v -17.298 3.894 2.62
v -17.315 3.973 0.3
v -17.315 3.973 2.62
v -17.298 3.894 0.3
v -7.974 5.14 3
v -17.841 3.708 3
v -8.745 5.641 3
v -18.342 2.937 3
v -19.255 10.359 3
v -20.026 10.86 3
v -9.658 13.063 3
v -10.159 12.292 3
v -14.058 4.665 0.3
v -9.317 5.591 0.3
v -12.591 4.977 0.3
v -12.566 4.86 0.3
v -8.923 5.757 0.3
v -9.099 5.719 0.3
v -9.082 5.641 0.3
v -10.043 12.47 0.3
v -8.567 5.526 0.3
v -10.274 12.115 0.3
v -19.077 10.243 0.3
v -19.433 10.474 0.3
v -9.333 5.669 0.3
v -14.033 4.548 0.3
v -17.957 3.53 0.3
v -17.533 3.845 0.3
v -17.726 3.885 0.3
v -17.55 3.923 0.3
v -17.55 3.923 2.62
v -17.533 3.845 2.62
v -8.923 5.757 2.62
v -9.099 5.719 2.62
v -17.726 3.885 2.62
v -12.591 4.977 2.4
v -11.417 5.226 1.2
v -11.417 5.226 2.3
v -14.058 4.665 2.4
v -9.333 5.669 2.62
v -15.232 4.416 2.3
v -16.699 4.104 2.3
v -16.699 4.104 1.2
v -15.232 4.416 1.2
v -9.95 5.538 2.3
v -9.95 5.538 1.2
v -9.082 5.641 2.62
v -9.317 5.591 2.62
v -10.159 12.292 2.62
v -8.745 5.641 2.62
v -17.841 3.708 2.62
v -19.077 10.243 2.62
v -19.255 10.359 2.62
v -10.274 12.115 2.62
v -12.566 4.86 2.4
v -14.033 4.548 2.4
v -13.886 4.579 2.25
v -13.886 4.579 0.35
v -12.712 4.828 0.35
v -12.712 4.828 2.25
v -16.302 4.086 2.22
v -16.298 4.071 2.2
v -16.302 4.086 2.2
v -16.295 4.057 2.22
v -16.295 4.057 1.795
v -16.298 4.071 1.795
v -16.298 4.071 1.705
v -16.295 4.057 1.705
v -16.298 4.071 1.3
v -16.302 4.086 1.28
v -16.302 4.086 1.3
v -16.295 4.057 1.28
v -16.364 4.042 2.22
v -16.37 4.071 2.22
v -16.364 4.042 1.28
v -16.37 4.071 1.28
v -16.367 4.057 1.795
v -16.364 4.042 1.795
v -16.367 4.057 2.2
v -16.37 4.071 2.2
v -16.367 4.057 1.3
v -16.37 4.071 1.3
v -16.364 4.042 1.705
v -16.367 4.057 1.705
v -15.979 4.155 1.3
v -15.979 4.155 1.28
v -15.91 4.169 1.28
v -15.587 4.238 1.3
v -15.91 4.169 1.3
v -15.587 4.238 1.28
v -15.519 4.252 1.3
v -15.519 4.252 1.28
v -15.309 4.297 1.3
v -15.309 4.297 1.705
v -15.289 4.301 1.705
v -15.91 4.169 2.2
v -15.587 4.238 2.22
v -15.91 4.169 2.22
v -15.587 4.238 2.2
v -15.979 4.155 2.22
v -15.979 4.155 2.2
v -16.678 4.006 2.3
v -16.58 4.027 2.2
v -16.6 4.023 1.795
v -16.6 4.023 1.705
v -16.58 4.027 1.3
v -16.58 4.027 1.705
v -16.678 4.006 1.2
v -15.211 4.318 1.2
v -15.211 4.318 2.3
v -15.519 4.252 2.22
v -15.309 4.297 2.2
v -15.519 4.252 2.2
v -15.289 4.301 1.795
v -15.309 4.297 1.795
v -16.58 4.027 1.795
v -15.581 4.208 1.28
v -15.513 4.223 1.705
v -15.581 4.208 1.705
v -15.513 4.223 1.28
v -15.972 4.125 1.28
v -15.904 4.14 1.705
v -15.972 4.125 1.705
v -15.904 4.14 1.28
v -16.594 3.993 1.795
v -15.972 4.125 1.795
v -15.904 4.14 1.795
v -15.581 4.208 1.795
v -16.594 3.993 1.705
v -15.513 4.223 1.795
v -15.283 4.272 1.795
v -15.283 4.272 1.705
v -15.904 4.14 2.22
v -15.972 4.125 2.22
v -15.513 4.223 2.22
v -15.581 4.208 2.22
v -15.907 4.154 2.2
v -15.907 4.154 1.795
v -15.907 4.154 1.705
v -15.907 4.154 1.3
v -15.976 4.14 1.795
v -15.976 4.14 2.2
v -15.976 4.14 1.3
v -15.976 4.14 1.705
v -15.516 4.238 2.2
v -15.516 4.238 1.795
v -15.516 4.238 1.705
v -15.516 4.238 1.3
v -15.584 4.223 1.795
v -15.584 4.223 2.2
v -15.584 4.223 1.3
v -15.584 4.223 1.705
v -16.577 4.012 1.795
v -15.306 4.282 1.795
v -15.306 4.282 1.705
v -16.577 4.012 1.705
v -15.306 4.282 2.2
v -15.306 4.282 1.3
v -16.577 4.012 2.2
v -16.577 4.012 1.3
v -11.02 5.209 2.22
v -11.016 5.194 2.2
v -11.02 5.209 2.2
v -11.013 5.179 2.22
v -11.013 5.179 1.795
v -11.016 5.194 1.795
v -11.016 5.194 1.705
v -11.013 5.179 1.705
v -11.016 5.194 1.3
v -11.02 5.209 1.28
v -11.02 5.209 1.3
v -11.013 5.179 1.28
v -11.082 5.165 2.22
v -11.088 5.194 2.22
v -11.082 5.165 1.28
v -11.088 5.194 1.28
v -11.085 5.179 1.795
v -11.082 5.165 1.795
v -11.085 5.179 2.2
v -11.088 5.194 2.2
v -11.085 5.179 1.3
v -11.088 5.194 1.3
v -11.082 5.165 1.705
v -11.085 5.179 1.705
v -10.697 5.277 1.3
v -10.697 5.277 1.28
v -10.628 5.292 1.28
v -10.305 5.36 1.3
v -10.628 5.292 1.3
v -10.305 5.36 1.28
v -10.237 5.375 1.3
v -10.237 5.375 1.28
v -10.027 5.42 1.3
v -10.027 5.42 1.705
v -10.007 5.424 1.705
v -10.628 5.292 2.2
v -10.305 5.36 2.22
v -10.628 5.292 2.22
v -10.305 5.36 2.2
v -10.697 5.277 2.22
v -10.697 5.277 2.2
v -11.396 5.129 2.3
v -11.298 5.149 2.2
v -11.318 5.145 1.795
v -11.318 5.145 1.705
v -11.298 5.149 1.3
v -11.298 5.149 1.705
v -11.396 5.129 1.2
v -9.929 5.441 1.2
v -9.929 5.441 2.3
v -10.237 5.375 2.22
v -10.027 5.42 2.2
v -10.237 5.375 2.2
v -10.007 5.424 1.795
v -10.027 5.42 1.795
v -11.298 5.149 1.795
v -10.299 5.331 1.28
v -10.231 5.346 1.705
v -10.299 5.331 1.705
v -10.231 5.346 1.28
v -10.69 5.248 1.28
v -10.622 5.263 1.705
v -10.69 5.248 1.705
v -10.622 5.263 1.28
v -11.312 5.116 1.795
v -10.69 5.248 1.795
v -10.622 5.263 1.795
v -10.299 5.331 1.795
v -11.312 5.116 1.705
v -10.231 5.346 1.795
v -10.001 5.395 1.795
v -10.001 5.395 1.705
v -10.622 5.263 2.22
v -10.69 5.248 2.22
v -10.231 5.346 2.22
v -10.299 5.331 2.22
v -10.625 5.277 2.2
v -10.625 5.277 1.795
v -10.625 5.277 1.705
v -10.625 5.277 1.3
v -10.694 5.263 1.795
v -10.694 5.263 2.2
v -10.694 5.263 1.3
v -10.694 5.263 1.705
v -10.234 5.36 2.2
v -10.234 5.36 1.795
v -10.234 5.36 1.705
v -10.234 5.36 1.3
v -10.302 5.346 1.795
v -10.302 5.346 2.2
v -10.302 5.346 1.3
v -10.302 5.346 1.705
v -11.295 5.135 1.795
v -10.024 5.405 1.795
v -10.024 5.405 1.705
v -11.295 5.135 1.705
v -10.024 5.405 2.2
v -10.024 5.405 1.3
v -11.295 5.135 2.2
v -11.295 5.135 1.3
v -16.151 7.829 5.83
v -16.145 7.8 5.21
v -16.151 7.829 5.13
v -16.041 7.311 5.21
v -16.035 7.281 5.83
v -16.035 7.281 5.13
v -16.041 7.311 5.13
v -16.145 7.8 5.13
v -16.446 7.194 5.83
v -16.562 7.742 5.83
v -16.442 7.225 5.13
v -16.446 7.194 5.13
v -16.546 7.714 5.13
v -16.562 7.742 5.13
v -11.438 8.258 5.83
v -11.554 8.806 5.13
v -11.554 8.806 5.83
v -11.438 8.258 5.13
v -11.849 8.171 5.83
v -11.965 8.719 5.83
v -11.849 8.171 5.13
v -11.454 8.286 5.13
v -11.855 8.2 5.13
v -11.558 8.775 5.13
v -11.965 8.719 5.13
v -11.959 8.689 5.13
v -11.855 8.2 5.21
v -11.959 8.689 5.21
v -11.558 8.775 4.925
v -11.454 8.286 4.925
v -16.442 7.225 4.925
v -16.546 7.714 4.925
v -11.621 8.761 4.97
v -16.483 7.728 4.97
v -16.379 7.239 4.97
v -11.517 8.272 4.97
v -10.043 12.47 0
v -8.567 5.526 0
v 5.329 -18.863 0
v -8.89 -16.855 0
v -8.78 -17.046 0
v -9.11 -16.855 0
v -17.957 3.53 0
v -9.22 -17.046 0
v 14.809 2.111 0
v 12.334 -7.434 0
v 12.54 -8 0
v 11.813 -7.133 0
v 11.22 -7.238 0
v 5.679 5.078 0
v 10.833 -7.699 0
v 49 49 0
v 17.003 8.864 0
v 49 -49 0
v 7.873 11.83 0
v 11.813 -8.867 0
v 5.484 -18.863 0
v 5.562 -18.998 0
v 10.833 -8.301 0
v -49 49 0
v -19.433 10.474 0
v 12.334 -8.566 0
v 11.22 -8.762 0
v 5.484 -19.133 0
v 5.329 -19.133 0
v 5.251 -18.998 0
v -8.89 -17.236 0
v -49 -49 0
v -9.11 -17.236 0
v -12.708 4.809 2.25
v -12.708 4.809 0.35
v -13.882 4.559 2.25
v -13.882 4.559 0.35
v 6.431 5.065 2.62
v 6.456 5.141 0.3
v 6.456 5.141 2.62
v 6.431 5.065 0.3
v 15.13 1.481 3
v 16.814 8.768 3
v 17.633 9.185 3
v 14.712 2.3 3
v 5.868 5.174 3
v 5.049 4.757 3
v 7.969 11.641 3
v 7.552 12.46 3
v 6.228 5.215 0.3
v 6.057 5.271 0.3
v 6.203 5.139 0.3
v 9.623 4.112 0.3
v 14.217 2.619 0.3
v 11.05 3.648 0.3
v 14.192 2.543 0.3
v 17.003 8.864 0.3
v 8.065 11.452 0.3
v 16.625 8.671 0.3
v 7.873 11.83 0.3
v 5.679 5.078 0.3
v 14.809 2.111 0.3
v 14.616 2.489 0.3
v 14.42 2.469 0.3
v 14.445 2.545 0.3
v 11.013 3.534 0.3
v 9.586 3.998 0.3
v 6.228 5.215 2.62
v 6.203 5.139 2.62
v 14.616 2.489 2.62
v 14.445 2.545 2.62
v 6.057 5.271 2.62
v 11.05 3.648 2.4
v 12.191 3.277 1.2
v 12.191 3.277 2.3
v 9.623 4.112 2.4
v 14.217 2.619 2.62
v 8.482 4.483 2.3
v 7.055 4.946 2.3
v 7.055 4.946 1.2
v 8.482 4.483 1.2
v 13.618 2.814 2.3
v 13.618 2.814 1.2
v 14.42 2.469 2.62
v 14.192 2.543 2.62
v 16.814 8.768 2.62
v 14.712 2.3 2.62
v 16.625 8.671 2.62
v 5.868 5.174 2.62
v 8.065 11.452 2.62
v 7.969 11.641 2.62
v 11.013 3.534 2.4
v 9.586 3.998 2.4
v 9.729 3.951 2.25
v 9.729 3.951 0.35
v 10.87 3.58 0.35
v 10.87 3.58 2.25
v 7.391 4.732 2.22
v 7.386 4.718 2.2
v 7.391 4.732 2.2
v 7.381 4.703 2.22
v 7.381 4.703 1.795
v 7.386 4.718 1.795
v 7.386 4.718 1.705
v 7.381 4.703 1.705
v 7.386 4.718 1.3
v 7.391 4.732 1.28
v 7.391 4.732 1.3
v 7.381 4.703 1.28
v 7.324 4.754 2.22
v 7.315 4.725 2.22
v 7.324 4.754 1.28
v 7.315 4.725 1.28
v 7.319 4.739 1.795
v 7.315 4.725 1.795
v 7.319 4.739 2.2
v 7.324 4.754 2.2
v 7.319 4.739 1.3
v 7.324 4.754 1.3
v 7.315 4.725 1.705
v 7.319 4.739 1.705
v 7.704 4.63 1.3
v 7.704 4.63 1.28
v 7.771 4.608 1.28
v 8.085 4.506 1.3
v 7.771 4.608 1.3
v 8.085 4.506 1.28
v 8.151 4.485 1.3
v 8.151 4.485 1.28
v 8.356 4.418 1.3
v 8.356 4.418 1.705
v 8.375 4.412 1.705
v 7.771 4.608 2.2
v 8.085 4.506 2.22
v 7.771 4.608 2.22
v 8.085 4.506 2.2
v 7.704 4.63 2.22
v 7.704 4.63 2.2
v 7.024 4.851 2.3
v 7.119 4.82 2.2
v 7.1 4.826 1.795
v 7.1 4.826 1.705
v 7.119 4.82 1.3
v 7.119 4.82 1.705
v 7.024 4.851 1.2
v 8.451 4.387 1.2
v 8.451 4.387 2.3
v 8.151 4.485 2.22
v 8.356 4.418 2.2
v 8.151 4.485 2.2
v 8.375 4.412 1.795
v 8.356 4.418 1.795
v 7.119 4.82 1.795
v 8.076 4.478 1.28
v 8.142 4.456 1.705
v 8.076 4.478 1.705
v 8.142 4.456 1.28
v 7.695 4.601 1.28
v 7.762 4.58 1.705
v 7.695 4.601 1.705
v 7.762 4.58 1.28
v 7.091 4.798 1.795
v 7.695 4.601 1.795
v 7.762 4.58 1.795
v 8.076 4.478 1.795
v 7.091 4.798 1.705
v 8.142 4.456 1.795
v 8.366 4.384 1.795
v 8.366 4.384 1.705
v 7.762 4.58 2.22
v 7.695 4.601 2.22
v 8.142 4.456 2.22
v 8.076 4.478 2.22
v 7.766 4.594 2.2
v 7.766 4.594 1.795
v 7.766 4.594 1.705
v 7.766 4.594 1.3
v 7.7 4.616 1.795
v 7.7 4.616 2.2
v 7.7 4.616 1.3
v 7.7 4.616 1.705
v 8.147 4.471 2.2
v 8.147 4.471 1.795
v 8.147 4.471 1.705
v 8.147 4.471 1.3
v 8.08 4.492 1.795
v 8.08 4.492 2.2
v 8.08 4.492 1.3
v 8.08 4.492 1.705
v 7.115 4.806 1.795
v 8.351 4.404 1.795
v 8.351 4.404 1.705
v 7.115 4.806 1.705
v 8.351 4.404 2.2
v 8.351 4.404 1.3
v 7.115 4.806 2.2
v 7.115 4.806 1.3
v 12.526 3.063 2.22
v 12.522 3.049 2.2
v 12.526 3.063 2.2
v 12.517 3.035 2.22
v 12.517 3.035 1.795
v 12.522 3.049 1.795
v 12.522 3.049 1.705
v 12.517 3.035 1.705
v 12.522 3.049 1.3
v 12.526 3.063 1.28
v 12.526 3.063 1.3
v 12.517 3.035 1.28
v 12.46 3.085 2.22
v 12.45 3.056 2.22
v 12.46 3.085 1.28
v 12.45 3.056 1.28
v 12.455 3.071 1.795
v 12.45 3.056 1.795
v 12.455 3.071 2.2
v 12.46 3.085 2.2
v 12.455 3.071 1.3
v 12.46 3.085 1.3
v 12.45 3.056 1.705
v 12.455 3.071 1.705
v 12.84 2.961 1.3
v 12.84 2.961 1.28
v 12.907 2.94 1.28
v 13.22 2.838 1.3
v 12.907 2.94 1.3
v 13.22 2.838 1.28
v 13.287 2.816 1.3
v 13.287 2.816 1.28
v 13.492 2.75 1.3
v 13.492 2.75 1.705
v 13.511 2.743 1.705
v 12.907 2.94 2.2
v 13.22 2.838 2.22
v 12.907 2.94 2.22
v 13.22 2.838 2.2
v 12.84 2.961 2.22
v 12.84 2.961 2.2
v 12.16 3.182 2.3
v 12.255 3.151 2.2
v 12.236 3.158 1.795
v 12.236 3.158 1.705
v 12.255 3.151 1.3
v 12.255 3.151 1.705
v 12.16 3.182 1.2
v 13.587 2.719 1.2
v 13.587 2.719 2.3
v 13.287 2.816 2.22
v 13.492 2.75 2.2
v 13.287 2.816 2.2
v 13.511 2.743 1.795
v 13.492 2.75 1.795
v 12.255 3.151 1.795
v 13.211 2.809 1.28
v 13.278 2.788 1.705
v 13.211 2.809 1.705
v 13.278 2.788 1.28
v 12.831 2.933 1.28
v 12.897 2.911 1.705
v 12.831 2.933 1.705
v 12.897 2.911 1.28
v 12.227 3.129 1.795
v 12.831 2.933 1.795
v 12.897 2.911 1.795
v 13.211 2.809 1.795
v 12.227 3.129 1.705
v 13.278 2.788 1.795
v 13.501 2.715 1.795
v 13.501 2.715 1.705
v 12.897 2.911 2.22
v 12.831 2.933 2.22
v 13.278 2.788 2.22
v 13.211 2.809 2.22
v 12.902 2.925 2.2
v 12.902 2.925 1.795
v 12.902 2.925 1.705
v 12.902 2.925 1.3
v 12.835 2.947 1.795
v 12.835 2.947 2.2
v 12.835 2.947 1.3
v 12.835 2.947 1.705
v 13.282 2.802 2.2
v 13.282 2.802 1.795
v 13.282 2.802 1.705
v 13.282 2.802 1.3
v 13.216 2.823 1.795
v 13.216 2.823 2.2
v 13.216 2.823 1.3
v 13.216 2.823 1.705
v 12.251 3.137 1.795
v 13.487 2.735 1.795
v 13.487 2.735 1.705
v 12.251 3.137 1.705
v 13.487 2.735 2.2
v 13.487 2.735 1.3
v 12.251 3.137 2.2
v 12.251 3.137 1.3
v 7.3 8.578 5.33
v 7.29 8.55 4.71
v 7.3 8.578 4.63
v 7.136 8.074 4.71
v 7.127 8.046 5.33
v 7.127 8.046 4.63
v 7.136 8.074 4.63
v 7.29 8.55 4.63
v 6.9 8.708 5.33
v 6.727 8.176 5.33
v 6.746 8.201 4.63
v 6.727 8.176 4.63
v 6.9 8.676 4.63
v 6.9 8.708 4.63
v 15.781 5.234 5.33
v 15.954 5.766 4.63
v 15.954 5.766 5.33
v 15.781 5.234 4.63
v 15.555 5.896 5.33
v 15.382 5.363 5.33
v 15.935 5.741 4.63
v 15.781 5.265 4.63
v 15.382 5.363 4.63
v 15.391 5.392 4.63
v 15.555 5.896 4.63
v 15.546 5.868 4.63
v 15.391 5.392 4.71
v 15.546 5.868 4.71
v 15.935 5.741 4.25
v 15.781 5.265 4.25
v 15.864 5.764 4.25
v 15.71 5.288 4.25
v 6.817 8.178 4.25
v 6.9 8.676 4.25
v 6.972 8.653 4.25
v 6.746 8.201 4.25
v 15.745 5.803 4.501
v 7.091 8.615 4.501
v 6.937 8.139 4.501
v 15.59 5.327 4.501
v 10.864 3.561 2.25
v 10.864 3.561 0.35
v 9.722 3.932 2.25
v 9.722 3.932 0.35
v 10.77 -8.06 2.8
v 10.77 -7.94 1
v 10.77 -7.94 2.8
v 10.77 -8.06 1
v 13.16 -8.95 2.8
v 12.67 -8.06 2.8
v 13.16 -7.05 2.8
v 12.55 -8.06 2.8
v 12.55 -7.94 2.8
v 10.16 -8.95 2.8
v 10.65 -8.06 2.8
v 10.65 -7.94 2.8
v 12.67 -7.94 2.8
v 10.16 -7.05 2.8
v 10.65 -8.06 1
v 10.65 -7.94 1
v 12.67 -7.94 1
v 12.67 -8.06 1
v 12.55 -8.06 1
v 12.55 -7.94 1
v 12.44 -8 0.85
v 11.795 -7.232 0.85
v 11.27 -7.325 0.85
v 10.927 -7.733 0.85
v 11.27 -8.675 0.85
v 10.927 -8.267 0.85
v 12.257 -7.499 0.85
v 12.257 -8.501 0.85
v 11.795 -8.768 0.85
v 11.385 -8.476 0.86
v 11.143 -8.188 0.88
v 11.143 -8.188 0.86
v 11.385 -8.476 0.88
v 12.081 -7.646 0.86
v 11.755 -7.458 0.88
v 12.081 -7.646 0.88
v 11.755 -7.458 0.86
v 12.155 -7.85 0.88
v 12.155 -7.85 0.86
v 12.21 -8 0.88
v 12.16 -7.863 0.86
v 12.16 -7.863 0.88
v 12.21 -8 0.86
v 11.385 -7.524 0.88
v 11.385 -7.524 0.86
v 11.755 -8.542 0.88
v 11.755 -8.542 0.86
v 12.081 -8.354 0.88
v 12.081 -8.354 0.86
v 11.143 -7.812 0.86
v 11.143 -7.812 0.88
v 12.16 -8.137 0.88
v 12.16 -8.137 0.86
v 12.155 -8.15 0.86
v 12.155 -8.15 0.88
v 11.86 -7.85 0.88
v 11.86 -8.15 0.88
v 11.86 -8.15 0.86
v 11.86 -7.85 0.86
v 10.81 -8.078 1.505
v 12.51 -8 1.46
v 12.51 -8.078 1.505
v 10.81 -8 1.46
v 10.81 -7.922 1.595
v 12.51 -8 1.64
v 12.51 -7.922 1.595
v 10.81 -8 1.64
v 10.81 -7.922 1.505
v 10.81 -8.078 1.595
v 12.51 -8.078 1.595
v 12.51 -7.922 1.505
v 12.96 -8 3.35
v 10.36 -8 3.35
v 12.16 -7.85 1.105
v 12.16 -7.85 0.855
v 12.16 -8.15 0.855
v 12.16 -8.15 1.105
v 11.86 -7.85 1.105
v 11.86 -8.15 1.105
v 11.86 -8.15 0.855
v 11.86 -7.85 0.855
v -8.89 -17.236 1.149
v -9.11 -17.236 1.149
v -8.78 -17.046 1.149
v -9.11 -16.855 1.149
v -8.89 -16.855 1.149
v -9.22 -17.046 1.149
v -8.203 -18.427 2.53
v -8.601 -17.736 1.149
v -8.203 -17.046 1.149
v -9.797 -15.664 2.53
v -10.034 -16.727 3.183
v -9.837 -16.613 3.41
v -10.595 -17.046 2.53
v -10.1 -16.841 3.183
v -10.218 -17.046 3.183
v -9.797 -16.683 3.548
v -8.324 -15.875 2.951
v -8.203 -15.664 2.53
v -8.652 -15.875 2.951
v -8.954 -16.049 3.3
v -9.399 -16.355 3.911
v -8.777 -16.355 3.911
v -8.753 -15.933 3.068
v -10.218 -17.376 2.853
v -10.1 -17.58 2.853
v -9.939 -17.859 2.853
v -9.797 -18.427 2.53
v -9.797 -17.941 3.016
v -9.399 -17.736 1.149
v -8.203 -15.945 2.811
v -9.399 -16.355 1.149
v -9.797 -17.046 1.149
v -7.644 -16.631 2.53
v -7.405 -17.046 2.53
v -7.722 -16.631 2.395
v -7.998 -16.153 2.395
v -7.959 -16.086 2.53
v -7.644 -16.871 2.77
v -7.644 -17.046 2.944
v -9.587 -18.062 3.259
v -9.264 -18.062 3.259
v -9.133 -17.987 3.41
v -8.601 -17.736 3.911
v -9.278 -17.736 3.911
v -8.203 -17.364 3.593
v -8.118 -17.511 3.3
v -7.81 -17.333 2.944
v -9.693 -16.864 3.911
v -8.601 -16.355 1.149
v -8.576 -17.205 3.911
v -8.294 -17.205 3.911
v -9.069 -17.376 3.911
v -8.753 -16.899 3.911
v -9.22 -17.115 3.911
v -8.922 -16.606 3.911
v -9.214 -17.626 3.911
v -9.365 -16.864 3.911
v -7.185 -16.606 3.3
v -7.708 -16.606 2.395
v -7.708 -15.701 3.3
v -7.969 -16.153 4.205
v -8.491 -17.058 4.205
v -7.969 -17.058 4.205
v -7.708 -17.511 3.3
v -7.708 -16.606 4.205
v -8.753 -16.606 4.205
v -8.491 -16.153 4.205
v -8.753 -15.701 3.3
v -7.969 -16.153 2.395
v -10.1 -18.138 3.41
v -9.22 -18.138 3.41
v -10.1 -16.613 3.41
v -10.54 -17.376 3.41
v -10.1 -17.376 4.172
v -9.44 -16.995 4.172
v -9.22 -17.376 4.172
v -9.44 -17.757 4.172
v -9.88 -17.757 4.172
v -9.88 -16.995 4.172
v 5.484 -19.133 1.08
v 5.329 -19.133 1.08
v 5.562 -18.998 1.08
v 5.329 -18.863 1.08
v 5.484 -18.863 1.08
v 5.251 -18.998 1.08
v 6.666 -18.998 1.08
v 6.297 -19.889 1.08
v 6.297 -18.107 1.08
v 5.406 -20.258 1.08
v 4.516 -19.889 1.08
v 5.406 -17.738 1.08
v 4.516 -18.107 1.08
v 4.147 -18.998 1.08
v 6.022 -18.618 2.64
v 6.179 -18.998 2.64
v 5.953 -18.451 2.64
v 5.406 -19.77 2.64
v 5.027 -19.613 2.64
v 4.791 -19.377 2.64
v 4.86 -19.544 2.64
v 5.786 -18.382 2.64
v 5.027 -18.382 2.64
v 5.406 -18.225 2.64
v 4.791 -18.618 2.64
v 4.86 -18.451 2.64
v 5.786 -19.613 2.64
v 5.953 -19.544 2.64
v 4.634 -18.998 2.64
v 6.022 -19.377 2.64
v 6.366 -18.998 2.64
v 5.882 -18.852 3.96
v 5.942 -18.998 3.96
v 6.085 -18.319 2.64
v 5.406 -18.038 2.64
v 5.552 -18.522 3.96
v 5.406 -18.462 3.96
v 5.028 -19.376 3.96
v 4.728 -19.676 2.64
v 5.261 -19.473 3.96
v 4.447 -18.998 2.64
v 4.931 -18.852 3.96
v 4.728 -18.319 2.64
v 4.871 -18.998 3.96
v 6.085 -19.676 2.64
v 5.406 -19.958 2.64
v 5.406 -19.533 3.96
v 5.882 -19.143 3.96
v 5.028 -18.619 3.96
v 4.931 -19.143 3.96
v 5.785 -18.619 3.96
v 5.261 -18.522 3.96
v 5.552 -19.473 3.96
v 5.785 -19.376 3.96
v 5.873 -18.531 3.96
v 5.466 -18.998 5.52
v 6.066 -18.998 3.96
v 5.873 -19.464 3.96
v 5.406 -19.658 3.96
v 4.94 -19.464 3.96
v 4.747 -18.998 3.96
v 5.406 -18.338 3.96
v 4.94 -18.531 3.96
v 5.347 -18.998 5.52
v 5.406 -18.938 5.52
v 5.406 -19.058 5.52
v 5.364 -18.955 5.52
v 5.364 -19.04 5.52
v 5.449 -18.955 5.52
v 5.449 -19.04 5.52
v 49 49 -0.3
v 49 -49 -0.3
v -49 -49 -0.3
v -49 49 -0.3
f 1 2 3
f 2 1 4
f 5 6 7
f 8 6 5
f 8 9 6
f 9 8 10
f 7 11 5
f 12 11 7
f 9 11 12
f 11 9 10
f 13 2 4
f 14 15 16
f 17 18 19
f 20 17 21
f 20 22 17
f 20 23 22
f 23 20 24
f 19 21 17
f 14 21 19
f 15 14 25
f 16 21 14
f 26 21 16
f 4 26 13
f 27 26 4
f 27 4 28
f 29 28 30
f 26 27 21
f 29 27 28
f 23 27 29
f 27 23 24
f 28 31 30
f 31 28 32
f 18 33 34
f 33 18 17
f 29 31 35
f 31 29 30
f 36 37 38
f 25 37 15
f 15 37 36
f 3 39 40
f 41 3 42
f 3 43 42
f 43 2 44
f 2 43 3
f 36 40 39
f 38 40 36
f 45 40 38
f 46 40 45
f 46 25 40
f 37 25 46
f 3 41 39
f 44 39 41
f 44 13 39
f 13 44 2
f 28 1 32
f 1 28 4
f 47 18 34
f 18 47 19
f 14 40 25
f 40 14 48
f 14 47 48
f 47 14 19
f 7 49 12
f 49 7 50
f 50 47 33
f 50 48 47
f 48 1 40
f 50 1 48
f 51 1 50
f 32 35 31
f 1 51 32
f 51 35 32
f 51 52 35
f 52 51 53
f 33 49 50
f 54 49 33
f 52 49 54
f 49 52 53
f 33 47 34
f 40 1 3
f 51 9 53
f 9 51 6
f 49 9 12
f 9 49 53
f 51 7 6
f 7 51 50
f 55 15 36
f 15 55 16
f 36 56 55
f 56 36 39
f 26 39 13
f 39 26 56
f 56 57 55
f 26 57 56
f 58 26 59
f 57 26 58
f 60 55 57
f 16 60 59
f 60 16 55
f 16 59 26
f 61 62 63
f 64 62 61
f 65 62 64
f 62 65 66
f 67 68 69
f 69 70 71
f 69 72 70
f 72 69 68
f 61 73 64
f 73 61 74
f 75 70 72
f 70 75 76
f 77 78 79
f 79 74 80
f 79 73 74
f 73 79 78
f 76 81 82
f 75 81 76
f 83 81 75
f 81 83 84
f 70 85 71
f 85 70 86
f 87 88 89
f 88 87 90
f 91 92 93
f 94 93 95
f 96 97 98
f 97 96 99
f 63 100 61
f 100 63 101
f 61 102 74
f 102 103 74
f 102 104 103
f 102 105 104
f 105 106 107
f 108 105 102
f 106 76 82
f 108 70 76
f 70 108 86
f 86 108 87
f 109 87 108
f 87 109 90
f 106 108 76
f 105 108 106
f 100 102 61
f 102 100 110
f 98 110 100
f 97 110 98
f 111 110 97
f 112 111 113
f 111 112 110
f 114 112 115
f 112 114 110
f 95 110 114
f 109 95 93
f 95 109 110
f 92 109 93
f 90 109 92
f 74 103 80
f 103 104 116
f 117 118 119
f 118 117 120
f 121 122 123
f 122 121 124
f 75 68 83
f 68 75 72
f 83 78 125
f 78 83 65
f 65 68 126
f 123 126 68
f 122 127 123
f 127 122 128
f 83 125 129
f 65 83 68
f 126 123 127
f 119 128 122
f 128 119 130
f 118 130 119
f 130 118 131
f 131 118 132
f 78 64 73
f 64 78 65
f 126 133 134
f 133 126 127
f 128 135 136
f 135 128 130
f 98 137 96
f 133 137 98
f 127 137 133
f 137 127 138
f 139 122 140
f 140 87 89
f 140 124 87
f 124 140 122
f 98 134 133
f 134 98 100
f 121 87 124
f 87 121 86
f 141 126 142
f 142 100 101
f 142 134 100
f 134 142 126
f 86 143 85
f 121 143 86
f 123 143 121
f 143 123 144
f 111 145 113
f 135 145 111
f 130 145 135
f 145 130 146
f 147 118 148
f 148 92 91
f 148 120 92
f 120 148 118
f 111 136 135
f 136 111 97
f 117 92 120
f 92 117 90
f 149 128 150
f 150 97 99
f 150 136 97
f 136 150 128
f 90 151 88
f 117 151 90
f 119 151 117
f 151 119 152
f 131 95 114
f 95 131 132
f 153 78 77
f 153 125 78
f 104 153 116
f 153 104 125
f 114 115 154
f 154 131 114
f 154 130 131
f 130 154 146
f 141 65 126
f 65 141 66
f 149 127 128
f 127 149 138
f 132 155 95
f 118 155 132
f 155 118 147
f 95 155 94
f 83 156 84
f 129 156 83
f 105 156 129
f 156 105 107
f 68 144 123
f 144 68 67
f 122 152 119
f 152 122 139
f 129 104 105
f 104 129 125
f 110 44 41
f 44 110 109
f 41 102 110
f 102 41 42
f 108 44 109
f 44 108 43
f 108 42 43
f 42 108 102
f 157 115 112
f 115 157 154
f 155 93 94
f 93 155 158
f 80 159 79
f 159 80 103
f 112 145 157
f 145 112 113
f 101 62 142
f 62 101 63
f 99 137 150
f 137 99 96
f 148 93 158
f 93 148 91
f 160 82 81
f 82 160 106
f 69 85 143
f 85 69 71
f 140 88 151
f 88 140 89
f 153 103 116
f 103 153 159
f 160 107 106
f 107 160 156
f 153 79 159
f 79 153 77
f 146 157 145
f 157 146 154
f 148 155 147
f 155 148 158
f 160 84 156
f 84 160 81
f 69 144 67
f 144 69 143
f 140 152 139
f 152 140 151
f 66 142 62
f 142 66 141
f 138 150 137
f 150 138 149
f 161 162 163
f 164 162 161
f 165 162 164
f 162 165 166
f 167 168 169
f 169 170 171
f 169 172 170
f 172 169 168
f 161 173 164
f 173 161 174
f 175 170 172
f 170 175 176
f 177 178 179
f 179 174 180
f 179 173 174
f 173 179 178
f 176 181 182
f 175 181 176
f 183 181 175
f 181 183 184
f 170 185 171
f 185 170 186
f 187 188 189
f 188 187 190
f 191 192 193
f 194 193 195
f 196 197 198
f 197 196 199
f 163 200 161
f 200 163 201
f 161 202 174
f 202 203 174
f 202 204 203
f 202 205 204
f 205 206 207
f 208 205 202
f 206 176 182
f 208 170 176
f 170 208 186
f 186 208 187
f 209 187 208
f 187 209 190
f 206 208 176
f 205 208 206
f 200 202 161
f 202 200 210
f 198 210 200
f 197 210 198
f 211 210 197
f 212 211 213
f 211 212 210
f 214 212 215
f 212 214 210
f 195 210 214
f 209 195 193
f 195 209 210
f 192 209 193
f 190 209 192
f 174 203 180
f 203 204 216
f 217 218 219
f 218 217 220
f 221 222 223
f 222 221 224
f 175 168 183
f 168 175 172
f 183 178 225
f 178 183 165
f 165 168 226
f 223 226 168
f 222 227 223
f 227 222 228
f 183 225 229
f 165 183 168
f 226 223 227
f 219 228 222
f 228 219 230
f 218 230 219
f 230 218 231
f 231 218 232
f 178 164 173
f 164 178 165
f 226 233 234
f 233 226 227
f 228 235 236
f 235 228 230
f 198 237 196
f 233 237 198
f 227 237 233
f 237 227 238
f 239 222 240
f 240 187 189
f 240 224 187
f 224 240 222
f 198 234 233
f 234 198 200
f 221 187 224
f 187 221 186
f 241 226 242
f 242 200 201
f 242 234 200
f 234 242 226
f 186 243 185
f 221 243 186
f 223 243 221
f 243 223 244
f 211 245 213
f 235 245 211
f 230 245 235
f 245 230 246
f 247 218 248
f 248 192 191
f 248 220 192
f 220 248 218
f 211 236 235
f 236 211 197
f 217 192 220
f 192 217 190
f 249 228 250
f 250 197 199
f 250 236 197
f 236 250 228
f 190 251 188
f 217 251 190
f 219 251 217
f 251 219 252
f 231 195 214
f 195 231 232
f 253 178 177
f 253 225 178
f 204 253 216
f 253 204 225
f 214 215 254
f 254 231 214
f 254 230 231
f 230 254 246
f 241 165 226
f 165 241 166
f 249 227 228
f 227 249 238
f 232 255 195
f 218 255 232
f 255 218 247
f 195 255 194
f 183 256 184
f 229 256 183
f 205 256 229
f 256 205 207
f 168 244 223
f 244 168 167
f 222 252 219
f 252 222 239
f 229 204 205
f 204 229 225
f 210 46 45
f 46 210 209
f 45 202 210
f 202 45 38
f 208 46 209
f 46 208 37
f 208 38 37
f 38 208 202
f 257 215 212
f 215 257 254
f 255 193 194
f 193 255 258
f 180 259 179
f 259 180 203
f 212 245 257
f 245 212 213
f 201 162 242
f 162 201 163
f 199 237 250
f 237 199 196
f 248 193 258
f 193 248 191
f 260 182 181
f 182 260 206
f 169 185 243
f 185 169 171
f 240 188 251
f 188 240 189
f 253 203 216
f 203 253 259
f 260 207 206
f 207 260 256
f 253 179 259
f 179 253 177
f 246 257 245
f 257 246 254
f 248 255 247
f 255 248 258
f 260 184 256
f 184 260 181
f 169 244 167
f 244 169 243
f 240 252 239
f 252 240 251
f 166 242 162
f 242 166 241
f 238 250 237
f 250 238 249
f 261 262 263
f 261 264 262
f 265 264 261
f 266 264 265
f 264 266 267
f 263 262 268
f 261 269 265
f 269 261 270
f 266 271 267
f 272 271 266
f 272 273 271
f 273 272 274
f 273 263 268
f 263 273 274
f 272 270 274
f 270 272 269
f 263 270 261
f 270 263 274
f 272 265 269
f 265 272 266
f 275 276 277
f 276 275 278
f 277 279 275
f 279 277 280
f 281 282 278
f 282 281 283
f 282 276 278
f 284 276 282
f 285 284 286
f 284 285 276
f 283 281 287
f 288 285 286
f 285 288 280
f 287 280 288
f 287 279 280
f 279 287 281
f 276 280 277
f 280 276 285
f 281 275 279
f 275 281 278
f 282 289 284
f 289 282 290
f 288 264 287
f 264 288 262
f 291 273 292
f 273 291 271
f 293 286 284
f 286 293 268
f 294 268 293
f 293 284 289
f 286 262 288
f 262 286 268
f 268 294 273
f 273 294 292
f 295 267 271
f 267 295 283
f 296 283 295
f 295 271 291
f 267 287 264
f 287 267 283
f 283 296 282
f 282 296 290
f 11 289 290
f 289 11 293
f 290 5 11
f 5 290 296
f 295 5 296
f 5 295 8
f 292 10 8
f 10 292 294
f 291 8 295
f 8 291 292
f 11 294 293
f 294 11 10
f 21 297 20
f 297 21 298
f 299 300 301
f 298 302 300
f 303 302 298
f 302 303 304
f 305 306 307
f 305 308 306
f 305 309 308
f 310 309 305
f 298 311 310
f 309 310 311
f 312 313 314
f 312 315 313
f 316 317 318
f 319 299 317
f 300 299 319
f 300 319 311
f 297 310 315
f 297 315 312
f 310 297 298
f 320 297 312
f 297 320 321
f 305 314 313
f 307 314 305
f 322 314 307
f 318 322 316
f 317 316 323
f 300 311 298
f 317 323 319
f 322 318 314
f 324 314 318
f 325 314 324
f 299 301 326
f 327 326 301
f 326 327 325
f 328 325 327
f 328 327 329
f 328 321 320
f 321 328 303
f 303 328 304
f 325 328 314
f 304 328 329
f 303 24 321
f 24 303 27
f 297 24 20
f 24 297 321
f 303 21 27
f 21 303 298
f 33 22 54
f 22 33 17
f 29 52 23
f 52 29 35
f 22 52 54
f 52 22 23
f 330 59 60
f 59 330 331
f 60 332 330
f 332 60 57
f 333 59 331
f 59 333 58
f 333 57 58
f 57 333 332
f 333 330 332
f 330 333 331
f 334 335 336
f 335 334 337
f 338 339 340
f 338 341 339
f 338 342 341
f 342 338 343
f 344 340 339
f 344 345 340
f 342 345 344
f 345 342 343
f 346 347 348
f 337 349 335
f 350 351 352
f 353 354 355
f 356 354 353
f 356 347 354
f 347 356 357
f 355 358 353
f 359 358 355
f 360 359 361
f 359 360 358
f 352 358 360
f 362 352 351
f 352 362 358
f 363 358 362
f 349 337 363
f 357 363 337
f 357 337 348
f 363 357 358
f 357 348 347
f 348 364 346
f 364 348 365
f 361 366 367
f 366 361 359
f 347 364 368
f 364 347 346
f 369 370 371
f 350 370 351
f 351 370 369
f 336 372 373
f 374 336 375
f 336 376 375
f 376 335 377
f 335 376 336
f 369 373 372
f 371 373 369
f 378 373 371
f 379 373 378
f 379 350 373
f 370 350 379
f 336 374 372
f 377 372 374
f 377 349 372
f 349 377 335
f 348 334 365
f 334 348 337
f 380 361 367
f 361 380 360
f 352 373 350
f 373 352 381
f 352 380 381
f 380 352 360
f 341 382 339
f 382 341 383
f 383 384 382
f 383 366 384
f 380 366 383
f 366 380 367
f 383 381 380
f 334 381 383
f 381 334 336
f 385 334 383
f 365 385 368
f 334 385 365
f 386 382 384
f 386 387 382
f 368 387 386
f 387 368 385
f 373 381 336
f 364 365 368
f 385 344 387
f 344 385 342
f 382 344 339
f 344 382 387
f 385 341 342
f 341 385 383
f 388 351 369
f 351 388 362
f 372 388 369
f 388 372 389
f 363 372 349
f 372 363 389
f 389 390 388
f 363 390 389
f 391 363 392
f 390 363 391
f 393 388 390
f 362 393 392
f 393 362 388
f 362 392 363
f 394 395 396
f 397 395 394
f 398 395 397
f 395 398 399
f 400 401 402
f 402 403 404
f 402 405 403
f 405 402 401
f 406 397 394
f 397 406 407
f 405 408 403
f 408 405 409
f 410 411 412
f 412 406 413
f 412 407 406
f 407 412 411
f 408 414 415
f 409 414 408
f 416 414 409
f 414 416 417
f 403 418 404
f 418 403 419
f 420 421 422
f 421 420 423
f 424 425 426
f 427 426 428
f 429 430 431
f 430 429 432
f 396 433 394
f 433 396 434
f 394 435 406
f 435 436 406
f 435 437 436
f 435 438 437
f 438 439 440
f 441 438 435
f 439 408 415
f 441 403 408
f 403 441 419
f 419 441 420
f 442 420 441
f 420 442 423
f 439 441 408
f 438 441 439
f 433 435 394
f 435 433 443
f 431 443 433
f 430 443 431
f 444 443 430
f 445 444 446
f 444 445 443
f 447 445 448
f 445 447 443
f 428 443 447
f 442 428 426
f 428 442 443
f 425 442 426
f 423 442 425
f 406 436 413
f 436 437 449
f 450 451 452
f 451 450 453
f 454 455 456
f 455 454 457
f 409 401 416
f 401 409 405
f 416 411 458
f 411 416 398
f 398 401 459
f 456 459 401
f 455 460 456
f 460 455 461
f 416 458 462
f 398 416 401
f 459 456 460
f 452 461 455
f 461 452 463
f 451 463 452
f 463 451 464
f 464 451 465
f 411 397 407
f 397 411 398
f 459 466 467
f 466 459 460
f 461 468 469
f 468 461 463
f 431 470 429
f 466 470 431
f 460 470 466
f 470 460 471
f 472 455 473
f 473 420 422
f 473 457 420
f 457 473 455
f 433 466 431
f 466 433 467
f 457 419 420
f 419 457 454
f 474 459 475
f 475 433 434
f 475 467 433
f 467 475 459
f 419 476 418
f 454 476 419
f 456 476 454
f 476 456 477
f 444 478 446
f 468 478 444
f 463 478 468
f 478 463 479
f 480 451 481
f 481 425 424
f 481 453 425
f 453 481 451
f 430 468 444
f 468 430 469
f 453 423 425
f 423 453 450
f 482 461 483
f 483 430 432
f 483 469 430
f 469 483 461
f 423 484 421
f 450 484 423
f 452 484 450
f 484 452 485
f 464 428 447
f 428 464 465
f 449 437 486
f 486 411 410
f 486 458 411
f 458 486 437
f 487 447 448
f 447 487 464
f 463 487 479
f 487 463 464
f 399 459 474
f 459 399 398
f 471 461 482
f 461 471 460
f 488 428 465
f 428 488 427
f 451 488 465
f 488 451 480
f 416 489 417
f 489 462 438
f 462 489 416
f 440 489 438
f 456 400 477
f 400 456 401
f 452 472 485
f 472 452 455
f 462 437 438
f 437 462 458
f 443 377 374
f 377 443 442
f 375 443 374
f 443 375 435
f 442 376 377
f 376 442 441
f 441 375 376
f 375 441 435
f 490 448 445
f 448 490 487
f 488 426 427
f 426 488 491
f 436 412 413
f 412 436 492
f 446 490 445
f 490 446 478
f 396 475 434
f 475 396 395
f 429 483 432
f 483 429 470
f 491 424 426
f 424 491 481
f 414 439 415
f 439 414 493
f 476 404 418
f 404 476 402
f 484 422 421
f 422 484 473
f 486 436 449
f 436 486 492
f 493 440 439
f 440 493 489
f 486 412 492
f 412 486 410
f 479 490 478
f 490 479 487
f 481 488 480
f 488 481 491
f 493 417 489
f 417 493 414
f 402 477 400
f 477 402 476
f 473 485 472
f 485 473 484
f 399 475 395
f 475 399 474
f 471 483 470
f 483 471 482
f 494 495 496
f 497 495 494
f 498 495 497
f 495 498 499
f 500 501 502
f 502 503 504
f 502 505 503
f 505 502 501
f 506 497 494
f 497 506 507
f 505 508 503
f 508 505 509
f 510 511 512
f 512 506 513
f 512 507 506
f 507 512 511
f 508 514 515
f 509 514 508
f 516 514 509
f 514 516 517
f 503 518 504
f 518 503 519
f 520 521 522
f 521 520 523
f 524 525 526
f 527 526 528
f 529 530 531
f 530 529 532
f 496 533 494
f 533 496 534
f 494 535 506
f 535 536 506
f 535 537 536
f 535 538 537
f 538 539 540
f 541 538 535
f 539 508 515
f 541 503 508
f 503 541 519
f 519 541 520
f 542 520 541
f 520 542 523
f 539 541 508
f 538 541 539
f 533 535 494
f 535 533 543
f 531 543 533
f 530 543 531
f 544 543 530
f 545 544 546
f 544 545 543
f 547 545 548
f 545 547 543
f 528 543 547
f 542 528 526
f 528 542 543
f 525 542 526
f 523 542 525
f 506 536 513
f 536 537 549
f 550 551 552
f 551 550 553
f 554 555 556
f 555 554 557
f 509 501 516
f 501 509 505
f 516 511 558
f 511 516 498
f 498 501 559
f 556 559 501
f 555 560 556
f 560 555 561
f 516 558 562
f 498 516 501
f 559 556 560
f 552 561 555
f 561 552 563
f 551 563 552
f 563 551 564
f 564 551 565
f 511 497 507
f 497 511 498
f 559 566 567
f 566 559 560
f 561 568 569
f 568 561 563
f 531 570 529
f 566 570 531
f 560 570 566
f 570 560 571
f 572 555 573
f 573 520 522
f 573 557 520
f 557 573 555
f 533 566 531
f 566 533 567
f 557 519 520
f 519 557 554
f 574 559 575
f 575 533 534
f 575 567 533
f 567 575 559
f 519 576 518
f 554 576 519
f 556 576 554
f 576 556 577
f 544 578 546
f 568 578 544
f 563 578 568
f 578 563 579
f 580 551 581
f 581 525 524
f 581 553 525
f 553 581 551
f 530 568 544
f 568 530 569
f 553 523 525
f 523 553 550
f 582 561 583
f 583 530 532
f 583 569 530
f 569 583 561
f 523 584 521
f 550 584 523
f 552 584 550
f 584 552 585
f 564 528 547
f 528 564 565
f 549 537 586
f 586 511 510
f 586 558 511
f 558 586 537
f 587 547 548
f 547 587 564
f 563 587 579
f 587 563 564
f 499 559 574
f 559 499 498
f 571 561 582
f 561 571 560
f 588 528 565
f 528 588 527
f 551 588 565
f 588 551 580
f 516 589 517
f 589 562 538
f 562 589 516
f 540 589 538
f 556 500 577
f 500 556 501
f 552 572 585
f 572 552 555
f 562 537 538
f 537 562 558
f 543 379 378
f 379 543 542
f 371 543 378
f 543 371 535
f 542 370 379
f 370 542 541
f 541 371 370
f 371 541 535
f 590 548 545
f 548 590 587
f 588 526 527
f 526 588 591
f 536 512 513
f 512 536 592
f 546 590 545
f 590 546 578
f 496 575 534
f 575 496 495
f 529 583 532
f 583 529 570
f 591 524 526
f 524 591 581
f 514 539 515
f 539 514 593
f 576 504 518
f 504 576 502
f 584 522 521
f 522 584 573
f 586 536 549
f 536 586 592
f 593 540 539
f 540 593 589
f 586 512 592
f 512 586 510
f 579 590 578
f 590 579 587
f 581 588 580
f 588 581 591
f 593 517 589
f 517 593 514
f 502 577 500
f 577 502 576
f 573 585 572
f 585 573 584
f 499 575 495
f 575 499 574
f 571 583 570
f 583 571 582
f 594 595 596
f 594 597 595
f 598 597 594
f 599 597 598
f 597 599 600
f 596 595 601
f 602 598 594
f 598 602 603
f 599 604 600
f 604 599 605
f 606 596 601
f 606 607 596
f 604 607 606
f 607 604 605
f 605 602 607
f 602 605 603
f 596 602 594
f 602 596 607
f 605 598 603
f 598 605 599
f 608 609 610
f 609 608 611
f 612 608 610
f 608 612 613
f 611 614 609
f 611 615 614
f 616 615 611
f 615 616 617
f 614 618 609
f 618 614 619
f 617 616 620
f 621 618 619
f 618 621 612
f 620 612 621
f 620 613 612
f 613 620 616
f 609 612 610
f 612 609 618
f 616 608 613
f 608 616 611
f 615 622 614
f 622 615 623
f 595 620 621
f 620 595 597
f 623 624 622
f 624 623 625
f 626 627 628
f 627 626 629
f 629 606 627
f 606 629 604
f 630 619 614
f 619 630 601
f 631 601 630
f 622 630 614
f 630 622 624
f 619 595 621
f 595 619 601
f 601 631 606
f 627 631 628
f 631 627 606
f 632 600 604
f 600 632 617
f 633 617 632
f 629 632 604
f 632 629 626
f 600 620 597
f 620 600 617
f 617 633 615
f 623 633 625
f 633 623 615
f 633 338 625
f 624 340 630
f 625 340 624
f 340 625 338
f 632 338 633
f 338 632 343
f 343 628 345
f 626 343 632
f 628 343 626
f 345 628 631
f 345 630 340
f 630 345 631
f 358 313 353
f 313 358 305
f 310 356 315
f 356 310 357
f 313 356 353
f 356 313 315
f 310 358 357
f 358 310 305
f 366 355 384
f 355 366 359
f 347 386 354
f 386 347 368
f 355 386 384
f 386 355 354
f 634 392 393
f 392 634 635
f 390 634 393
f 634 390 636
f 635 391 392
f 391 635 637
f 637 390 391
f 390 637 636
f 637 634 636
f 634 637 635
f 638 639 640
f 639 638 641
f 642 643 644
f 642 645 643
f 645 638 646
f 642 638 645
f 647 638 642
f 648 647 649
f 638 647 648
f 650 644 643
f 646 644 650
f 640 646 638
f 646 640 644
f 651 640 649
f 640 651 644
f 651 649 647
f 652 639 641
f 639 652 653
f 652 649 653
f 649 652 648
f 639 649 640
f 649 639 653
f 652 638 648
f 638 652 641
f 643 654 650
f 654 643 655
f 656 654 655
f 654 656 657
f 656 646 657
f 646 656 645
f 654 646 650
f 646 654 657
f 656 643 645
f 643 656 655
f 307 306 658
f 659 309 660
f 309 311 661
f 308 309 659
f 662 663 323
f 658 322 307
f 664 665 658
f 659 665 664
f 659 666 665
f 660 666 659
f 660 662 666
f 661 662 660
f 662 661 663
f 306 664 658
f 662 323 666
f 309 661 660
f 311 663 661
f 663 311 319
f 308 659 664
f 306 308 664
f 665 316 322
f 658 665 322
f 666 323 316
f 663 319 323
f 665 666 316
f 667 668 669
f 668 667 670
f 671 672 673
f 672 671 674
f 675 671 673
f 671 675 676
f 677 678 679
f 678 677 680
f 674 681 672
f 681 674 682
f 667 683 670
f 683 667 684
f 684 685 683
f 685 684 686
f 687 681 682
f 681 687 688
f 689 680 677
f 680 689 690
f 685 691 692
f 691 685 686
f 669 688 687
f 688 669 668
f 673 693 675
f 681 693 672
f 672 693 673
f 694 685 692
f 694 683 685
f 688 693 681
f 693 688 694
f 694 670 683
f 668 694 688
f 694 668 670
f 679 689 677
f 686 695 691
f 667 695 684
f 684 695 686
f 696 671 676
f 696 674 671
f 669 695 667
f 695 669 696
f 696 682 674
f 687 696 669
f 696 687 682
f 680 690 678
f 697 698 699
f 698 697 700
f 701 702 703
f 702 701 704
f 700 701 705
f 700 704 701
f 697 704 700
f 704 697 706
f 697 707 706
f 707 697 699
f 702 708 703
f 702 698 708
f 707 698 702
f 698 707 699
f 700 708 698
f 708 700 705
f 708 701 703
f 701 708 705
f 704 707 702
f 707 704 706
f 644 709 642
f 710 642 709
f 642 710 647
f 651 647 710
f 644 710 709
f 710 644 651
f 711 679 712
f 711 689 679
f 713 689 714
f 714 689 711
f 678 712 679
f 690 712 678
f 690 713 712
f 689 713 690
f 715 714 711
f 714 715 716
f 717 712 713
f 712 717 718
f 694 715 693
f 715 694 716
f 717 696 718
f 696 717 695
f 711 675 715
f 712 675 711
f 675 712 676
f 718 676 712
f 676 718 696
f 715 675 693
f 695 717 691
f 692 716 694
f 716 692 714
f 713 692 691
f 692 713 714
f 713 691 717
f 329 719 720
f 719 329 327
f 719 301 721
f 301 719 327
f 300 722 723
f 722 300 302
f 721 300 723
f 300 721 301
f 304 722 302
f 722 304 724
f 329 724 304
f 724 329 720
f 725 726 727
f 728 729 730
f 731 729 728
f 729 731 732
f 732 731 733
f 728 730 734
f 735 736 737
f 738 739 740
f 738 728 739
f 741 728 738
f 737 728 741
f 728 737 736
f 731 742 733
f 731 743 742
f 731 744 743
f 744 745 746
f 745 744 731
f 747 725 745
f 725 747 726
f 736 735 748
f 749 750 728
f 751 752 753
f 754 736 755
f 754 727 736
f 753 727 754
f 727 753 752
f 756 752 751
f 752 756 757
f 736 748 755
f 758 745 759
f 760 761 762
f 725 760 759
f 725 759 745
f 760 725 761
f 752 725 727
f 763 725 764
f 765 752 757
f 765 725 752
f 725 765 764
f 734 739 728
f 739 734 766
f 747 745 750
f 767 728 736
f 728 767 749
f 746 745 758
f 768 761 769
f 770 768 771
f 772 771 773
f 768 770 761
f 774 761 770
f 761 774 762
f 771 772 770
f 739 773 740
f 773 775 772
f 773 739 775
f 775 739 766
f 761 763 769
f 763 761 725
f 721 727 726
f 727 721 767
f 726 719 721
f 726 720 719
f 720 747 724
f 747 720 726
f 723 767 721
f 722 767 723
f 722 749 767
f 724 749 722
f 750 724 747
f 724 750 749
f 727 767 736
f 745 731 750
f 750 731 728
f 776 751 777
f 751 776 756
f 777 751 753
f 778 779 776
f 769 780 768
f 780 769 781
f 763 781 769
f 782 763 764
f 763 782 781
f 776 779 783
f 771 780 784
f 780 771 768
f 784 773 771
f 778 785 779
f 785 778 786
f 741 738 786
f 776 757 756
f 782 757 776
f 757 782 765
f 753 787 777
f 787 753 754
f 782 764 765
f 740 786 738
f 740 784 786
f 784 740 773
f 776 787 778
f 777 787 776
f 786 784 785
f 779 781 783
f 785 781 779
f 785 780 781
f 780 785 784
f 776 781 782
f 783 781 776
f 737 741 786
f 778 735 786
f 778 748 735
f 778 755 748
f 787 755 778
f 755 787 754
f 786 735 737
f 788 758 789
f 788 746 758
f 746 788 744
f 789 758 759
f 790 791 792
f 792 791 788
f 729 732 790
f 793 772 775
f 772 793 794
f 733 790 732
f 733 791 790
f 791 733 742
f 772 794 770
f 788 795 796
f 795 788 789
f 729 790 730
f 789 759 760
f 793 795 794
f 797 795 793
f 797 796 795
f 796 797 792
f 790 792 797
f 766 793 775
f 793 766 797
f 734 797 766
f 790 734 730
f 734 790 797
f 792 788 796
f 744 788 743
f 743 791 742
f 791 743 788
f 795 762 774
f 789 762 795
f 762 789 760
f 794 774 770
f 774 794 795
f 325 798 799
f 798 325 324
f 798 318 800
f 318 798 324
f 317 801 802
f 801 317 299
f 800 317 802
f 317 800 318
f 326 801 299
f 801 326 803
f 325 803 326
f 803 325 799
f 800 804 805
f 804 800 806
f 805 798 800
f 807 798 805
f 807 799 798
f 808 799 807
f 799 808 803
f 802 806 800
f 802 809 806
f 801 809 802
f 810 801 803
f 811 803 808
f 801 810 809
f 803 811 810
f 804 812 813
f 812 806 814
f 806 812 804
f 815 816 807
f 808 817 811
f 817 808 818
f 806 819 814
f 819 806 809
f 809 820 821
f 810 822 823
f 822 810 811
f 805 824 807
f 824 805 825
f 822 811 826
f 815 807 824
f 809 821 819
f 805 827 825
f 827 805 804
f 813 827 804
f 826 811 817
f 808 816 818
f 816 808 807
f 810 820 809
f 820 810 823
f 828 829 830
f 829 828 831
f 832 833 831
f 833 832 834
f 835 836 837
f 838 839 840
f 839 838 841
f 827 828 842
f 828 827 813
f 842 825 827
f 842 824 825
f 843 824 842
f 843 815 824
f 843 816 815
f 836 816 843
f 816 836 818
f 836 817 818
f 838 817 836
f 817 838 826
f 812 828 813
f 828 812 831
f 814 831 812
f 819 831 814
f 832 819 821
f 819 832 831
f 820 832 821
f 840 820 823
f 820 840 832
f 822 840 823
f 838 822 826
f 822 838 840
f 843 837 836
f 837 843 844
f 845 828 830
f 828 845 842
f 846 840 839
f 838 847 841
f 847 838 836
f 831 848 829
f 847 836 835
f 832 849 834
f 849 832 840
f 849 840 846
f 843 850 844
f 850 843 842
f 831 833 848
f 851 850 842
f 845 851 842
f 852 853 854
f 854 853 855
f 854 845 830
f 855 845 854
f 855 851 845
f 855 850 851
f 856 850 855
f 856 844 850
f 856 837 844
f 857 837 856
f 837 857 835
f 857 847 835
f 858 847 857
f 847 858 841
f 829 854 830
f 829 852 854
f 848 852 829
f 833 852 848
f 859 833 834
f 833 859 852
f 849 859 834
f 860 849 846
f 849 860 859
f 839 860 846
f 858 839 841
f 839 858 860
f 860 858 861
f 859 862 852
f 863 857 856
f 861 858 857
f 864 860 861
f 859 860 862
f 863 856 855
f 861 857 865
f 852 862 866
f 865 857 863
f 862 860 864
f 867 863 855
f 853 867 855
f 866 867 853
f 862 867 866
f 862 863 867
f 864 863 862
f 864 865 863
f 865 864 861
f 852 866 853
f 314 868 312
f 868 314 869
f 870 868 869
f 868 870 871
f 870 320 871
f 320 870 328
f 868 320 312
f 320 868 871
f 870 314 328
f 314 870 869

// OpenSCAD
// generated by ScadLibrary scene assembly
// This flat placement format can be reopened in the Scene Assembly object editor.
$fn = 12;
use <../lib/kit_old_city.scad>
use <../lib/kit_city_hd.scad>

color([0.50, 0.51, 0.53]) translate([0, 0, -0.15]) cube([98.0, 98.0, 0.3], center = true);

translate([-14.0000, 8.0000, 0.0000]) rotate([0.0000, 0.0000, 12.0000]) scale([1.00000, 1.00000, 1.00000]) oc_bldg_house(seed = 3);
translate([11.3407, 6.9709, 0.0000]) rotate([0.0000, 0.0000, -18.0000]) scale([1.00000, 1.00000, 1.00000]) oc_bldg_house(seed = 7);
translate([11.6598, -8.0000, 0.0000]) rotate([0.0000, -0.0000, 0.0000]) scale([1.00000, 1.00000, 1.00000]) oc_prop_well();
translate([-9.0000, -17.0456, 0.0000]) rotate([0.0000, -0.0000, 0.0000]) scale([1.10000, 1.10000, 1.10000]) hc_nature_tree(1.0, 4);
translate([5.4065, -18.9976, 0.0000]) rotate([0.0000, -0.0000, 0.0000]) scale([1.20000, 1.20000, 1.20000]) oc_nature_pine(1.0);
